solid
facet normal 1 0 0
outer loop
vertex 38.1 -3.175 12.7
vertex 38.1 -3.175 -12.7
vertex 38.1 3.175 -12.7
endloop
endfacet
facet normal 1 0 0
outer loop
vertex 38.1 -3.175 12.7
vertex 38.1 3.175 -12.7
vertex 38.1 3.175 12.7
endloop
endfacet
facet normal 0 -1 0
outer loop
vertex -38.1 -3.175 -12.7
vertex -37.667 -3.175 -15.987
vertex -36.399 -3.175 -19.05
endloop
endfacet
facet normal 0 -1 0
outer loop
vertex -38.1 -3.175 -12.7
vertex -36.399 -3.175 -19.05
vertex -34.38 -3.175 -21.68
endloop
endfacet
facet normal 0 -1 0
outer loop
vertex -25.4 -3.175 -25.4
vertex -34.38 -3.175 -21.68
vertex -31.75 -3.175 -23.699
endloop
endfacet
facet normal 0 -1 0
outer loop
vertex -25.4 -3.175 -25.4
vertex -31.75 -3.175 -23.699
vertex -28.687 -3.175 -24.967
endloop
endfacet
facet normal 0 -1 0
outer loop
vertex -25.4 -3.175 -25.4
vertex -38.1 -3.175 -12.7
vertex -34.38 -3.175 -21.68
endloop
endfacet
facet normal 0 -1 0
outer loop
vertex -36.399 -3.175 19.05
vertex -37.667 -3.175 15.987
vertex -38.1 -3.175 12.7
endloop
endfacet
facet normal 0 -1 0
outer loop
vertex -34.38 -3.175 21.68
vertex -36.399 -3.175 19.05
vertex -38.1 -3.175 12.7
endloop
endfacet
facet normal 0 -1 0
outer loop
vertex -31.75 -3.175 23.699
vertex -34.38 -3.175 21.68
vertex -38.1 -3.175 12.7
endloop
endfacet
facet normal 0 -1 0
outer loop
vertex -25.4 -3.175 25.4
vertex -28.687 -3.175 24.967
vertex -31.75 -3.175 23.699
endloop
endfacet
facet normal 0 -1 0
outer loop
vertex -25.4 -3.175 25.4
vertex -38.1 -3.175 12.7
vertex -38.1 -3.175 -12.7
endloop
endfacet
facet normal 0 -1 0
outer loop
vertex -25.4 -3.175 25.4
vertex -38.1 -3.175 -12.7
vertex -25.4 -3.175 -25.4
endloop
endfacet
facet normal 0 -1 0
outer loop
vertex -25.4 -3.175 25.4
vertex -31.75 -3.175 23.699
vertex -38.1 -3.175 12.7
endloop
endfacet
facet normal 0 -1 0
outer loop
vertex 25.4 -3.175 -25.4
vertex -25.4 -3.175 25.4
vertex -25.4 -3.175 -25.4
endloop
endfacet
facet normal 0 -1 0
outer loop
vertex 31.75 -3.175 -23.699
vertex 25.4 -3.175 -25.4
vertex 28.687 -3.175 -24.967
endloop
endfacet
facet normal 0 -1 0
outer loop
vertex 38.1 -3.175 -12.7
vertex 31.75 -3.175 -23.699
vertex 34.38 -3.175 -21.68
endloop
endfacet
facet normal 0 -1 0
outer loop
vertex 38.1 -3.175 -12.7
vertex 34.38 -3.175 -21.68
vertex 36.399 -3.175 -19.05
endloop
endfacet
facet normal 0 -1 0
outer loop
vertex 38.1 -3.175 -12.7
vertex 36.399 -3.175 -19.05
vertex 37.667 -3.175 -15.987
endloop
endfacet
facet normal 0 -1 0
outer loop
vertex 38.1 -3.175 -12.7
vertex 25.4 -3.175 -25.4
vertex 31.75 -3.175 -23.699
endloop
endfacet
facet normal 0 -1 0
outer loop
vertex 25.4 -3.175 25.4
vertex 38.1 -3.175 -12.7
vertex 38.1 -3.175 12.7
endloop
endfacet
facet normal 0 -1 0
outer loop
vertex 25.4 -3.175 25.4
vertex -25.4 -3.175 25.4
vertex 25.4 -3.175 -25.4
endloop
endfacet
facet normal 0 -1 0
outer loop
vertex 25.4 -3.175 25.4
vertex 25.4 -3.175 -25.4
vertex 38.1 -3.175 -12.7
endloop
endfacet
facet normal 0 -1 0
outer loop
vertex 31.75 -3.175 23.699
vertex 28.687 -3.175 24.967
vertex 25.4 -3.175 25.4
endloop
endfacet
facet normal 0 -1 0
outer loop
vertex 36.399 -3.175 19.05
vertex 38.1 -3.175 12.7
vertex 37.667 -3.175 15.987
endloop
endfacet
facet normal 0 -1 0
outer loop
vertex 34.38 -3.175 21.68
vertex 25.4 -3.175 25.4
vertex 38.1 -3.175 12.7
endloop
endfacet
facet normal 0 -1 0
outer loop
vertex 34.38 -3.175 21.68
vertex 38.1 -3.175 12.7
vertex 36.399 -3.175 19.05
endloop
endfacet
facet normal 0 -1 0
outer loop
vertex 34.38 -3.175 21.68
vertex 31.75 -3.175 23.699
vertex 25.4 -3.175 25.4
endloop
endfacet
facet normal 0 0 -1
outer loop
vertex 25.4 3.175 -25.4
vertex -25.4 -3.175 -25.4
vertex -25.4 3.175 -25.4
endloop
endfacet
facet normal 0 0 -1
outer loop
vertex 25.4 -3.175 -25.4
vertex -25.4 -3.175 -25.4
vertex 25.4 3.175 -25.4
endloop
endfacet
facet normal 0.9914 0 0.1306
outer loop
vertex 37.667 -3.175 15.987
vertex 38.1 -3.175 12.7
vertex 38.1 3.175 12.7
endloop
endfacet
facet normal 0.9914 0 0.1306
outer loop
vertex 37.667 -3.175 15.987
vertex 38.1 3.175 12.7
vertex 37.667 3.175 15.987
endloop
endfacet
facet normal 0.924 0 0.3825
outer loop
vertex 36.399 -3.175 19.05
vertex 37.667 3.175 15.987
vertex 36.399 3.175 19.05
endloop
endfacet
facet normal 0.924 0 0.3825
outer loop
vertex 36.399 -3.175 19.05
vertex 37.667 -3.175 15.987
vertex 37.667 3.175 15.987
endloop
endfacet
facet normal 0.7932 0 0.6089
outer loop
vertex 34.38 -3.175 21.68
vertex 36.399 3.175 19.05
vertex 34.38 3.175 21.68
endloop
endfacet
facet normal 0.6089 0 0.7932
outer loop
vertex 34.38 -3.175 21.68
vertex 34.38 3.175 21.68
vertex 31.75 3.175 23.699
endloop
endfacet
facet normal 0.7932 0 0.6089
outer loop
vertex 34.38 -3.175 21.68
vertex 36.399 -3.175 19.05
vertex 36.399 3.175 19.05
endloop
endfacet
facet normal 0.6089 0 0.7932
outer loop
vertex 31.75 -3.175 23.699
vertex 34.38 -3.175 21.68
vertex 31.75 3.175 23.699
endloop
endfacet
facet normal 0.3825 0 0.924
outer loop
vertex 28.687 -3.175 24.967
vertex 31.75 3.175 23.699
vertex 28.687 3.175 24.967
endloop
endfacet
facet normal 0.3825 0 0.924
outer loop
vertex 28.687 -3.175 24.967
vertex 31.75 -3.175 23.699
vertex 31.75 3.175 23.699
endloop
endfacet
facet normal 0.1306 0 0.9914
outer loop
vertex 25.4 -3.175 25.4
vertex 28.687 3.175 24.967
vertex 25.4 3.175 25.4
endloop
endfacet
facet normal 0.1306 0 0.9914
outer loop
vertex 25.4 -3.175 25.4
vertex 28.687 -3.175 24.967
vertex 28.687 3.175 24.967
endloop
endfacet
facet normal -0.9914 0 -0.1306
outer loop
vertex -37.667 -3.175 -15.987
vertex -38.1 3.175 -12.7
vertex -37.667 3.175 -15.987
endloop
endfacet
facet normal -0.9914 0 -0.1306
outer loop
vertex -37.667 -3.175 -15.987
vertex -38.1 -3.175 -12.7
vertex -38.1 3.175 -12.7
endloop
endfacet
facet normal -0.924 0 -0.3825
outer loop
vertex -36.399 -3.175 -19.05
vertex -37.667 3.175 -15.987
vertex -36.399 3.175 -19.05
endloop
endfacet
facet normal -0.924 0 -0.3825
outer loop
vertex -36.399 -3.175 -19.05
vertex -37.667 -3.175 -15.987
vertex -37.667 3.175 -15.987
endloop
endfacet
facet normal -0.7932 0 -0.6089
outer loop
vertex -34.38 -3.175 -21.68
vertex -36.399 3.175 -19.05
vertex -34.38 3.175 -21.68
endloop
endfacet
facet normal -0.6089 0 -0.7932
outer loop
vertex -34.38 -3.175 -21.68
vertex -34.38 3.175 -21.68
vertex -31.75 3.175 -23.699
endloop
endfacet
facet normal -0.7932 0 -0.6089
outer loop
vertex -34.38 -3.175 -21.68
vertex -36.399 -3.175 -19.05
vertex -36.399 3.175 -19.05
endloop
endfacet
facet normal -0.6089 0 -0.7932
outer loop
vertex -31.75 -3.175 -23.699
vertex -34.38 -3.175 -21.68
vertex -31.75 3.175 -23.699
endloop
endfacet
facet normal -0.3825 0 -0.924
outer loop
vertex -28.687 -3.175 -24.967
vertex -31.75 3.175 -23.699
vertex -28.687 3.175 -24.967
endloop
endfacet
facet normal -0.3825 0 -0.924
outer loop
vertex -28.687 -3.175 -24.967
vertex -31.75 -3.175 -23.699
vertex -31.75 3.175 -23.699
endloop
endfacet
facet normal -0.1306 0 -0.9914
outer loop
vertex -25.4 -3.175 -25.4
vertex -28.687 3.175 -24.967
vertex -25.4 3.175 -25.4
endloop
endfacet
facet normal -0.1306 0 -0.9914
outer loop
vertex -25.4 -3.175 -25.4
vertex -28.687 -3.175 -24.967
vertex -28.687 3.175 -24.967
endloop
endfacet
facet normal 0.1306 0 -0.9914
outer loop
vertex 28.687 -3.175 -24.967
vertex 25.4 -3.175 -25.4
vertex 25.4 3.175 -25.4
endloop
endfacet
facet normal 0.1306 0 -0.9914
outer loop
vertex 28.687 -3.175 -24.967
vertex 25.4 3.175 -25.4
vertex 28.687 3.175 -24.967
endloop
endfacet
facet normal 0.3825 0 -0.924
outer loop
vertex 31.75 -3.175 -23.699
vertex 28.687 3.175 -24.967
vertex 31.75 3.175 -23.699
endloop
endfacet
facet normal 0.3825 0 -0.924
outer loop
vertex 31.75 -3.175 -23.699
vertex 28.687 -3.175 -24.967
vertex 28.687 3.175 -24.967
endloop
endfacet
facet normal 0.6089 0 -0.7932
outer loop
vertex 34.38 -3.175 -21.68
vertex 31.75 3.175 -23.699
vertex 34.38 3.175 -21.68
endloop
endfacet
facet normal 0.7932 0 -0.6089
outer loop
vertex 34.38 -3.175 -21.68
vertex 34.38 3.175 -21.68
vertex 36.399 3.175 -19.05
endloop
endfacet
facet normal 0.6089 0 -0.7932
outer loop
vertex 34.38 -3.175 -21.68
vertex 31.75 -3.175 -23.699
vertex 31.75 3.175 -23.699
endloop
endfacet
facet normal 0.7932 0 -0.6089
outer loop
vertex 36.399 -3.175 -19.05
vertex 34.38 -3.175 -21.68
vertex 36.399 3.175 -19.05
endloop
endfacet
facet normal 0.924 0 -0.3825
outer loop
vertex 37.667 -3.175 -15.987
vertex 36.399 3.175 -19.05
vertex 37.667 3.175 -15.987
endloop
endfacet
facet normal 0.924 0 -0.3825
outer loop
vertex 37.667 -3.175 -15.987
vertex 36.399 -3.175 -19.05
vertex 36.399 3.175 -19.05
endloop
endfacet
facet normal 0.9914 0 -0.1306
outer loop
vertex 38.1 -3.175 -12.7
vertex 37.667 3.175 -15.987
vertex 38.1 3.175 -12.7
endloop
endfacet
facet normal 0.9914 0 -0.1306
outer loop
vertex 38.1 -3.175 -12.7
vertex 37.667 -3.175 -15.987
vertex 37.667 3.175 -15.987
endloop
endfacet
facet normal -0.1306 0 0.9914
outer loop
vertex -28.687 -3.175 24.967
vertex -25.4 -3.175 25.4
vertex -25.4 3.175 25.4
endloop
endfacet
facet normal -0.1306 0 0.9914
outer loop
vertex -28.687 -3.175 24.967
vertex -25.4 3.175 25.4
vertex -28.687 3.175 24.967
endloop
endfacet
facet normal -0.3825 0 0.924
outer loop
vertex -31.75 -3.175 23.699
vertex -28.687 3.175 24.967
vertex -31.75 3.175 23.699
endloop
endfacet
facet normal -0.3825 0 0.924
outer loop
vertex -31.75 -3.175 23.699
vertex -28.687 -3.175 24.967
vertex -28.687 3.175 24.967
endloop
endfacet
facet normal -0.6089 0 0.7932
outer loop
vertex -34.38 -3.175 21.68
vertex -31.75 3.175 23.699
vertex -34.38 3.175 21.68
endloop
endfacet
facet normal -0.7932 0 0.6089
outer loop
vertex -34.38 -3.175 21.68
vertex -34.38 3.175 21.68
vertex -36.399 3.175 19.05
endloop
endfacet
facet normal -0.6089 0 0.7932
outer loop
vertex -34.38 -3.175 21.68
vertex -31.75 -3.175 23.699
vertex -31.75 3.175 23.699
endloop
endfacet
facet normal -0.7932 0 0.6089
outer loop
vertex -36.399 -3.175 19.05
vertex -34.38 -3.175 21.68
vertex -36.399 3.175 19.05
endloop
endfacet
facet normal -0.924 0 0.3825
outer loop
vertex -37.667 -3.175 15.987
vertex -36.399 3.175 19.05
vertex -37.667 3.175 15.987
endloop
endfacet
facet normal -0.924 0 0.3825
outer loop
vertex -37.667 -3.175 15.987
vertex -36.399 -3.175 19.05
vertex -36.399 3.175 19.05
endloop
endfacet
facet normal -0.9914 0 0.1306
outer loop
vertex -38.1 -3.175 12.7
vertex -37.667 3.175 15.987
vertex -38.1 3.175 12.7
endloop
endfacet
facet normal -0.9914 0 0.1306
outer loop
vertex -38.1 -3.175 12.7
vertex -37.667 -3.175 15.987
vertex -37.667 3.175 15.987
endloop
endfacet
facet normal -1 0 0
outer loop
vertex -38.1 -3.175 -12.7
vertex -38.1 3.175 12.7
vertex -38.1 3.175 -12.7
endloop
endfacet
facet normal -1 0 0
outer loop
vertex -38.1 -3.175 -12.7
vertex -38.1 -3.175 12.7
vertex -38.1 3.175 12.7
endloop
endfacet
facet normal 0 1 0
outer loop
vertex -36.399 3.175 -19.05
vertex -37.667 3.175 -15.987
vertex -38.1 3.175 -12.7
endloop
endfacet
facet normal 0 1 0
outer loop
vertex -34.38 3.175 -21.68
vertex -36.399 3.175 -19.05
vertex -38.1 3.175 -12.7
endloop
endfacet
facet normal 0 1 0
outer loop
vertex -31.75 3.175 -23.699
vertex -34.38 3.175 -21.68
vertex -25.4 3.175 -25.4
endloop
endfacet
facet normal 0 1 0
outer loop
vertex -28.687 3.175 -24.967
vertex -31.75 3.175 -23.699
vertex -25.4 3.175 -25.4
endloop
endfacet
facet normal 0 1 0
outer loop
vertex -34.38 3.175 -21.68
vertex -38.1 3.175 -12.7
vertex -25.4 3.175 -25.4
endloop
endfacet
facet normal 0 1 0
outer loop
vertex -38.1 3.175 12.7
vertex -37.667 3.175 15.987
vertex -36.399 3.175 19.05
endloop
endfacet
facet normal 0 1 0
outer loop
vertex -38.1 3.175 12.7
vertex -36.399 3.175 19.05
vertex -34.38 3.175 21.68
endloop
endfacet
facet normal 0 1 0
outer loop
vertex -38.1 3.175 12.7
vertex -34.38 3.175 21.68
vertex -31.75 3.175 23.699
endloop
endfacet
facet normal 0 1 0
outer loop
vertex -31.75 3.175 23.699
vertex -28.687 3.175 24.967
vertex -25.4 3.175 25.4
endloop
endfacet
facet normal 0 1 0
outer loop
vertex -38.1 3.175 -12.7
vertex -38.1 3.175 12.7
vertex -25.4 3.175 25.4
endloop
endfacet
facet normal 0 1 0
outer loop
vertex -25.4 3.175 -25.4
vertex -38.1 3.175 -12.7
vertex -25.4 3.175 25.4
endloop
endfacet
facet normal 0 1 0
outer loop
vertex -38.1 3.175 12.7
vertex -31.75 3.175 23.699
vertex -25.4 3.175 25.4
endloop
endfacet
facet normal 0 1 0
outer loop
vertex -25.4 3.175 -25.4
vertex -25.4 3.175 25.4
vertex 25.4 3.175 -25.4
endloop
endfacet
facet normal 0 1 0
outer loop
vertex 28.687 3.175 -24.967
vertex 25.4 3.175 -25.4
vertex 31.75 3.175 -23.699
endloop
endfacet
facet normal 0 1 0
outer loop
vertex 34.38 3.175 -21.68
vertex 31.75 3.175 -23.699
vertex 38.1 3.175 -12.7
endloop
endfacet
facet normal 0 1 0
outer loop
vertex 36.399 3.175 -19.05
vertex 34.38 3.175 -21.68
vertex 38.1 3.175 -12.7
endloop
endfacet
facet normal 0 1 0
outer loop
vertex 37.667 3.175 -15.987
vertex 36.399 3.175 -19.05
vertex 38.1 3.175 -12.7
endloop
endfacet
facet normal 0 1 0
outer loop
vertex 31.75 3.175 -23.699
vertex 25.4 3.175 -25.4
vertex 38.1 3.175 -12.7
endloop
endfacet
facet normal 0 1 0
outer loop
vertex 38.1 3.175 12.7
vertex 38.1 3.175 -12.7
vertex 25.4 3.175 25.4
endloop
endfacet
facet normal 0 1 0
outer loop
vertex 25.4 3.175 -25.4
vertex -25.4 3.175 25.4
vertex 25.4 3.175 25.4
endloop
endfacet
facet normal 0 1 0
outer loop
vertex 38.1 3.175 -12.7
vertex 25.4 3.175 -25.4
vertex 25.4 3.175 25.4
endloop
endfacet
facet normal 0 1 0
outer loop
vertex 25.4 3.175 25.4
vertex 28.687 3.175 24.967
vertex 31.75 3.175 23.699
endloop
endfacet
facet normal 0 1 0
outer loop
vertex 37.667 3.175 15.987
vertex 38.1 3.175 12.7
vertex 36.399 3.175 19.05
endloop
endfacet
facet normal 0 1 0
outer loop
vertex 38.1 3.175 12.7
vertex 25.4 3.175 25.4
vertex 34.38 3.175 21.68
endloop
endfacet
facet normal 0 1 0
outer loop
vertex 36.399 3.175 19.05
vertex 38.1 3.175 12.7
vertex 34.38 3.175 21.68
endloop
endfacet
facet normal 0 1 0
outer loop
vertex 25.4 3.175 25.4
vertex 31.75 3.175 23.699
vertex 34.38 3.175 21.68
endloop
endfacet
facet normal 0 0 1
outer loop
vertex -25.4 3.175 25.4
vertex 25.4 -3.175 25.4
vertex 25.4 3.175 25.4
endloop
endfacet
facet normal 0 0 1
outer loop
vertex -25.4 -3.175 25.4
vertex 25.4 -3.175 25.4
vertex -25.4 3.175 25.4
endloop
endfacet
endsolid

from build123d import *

# Parameters (mm, degrees)
F1_DEPTH = 3.175


with BuildPart() as f1:
    # F0 (on Front) → F1 (new body, symmetric)
    with BuildSketch(Plane.XZ):
        with BuildLine():
            Line((-25.4, -25.4), (25.4, -25.4))
            ThreePointArc((25.4, -25.4), (34.3802561211, -21.6802561211), (38.1, -12.7))
            Line((38.1, -12.7), (38.1, 12.7))
            ThreePointArc((38.1, 12.7), (34.3802561211, 21.6802561211), (25.4, 25.4))
            Line((25.4, 25.4), (-25.4, 25.4))
            ThreePointArc((-25.4, 25.4), (-34.3802561211, 21.6802561211), (-38.1, 12.7))
            Line((-38.1, 12.7), (-38.1, -12.7))
            ThreePointArc((-38.1, -12.7), (-34.3802561211, -21.6802561211), (-25.4, -25.4))
        make_face()
    extrude(amount=F1_DEPTH, both=True)


solid = f1.part
